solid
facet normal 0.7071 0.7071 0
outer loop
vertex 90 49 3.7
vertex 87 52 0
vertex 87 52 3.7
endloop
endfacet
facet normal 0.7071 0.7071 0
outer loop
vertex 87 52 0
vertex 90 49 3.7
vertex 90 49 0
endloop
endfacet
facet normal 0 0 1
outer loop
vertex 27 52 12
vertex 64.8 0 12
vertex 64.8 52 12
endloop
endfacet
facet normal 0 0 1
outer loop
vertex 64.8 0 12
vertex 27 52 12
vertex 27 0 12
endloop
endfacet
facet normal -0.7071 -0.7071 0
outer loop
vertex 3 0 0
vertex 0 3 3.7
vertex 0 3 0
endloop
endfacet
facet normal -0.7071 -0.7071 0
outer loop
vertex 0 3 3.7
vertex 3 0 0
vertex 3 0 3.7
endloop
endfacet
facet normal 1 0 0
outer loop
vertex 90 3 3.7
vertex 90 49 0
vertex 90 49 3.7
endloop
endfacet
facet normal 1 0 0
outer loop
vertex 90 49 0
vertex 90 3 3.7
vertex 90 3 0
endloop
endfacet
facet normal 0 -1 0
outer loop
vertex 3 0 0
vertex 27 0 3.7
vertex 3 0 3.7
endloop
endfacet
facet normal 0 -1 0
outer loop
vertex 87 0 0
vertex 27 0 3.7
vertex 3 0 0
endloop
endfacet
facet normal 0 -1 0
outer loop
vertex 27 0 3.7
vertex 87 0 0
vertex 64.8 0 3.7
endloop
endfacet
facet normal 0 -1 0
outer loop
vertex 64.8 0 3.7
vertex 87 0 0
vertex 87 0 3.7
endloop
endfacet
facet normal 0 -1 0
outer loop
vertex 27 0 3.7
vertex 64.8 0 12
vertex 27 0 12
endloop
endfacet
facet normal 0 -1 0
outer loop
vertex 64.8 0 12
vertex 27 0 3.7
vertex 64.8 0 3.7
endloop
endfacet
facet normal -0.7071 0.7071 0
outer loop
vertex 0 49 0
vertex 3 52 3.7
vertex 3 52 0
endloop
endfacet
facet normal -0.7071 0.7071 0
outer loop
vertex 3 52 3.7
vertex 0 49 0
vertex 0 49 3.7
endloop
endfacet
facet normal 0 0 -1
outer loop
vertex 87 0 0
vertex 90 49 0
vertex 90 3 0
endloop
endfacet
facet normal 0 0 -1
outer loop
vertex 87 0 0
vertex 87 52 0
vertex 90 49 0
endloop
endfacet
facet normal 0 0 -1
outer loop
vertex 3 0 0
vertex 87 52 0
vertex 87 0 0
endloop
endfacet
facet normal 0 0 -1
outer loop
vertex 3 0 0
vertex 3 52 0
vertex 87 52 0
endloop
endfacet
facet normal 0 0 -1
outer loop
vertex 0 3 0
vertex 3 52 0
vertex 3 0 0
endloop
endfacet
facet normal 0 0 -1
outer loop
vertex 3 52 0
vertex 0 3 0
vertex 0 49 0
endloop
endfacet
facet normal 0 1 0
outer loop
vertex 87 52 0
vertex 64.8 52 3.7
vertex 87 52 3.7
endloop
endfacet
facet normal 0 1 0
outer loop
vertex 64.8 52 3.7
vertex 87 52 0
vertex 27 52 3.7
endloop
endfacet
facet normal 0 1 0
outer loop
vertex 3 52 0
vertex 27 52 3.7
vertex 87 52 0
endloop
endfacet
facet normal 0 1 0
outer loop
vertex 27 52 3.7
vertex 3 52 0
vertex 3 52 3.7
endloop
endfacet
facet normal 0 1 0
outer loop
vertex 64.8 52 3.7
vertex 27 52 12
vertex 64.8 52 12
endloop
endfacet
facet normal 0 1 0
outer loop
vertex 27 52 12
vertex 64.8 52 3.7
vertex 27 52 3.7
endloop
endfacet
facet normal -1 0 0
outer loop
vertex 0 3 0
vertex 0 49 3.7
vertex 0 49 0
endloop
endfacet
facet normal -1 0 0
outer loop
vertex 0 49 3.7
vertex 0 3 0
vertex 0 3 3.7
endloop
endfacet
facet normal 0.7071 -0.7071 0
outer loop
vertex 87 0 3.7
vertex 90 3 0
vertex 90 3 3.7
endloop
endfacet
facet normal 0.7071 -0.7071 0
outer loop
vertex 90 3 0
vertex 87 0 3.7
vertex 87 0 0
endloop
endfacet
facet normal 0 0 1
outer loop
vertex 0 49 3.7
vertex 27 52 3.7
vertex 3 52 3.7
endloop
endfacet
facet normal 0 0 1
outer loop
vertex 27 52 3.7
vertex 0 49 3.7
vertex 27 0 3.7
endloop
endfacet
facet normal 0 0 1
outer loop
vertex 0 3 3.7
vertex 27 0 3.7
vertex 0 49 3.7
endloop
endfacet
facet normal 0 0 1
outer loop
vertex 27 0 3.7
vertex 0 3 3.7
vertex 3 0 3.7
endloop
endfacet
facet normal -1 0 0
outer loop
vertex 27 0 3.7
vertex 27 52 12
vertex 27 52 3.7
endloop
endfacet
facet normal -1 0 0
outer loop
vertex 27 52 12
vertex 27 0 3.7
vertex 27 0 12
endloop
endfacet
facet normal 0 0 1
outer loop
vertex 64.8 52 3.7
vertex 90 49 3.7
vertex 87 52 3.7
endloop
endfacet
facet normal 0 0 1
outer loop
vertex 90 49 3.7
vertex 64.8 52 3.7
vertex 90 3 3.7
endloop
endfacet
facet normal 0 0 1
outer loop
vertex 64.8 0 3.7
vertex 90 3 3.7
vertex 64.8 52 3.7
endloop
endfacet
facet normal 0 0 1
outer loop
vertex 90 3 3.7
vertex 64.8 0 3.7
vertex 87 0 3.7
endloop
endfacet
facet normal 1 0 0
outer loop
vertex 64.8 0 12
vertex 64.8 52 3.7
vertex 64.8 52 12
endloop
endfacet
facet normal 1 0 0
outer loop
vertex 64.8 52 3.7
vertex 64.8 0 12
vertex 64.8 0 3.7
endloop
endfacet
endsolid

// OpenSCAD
$fn = 32;

// ----------------------------------------------------------------------
// Stepped bar: centerstep, 90 x 52 x 12/3.7 mm
// ----------------------------------------------------------------------

// --- parameters (mm) ---
bar_l = 90;               // bar length, X
bar_w = 52;               // bar width, Y
plate_t = 12;             // thickness of the thick zone, Z
thin_t = 3.7;             // thickness of the thin zone
corner_c = 3;             // corner chamfer of the bar
step_cut = 8.3;           // material removed from the thin zone
thick_from = 27;          // start of the thick middle zone
thick_to = 64.8;          // end of the thick middle zone
depth_1 = 8.3;            // depth of cut 1 from the top face
depth_2 = 8.3;            // depth of cut 2 from the top face
fit_tol = 0.1;            // declared fit tolerance (prompt contract)
free_tol = 0.3;           // declared free tolerance (prompt contract)

profile = [[3, 0], [87, 0], [90, 3], [90, 49], [87, 52], [3, 52], [0, 49], [0, 3]];  // primary outline, 8 points, counter clockwise
void_1 = [[-1, -1], [27, -1], [27, 53], [-1, 53]];  // thin left end, 4 points
void_2 = [[64.8, -1], [91, -1], [91, 53], [64.8, 53]];  // thin right end, 4 points

// --- the one profile operation ---
difference() {
  linear_extrude(height = plate_t) polygon(points = profile);
  translate([0, 0, plate_t - depth_1])
    linear_extrude(height = depth_1 + 1) polygon(points = void_1);
  translate([0, 0, plate_t - depth_2])
    linear_extrude(height = depth_2 + 1) polygon(points = void_2);
}
